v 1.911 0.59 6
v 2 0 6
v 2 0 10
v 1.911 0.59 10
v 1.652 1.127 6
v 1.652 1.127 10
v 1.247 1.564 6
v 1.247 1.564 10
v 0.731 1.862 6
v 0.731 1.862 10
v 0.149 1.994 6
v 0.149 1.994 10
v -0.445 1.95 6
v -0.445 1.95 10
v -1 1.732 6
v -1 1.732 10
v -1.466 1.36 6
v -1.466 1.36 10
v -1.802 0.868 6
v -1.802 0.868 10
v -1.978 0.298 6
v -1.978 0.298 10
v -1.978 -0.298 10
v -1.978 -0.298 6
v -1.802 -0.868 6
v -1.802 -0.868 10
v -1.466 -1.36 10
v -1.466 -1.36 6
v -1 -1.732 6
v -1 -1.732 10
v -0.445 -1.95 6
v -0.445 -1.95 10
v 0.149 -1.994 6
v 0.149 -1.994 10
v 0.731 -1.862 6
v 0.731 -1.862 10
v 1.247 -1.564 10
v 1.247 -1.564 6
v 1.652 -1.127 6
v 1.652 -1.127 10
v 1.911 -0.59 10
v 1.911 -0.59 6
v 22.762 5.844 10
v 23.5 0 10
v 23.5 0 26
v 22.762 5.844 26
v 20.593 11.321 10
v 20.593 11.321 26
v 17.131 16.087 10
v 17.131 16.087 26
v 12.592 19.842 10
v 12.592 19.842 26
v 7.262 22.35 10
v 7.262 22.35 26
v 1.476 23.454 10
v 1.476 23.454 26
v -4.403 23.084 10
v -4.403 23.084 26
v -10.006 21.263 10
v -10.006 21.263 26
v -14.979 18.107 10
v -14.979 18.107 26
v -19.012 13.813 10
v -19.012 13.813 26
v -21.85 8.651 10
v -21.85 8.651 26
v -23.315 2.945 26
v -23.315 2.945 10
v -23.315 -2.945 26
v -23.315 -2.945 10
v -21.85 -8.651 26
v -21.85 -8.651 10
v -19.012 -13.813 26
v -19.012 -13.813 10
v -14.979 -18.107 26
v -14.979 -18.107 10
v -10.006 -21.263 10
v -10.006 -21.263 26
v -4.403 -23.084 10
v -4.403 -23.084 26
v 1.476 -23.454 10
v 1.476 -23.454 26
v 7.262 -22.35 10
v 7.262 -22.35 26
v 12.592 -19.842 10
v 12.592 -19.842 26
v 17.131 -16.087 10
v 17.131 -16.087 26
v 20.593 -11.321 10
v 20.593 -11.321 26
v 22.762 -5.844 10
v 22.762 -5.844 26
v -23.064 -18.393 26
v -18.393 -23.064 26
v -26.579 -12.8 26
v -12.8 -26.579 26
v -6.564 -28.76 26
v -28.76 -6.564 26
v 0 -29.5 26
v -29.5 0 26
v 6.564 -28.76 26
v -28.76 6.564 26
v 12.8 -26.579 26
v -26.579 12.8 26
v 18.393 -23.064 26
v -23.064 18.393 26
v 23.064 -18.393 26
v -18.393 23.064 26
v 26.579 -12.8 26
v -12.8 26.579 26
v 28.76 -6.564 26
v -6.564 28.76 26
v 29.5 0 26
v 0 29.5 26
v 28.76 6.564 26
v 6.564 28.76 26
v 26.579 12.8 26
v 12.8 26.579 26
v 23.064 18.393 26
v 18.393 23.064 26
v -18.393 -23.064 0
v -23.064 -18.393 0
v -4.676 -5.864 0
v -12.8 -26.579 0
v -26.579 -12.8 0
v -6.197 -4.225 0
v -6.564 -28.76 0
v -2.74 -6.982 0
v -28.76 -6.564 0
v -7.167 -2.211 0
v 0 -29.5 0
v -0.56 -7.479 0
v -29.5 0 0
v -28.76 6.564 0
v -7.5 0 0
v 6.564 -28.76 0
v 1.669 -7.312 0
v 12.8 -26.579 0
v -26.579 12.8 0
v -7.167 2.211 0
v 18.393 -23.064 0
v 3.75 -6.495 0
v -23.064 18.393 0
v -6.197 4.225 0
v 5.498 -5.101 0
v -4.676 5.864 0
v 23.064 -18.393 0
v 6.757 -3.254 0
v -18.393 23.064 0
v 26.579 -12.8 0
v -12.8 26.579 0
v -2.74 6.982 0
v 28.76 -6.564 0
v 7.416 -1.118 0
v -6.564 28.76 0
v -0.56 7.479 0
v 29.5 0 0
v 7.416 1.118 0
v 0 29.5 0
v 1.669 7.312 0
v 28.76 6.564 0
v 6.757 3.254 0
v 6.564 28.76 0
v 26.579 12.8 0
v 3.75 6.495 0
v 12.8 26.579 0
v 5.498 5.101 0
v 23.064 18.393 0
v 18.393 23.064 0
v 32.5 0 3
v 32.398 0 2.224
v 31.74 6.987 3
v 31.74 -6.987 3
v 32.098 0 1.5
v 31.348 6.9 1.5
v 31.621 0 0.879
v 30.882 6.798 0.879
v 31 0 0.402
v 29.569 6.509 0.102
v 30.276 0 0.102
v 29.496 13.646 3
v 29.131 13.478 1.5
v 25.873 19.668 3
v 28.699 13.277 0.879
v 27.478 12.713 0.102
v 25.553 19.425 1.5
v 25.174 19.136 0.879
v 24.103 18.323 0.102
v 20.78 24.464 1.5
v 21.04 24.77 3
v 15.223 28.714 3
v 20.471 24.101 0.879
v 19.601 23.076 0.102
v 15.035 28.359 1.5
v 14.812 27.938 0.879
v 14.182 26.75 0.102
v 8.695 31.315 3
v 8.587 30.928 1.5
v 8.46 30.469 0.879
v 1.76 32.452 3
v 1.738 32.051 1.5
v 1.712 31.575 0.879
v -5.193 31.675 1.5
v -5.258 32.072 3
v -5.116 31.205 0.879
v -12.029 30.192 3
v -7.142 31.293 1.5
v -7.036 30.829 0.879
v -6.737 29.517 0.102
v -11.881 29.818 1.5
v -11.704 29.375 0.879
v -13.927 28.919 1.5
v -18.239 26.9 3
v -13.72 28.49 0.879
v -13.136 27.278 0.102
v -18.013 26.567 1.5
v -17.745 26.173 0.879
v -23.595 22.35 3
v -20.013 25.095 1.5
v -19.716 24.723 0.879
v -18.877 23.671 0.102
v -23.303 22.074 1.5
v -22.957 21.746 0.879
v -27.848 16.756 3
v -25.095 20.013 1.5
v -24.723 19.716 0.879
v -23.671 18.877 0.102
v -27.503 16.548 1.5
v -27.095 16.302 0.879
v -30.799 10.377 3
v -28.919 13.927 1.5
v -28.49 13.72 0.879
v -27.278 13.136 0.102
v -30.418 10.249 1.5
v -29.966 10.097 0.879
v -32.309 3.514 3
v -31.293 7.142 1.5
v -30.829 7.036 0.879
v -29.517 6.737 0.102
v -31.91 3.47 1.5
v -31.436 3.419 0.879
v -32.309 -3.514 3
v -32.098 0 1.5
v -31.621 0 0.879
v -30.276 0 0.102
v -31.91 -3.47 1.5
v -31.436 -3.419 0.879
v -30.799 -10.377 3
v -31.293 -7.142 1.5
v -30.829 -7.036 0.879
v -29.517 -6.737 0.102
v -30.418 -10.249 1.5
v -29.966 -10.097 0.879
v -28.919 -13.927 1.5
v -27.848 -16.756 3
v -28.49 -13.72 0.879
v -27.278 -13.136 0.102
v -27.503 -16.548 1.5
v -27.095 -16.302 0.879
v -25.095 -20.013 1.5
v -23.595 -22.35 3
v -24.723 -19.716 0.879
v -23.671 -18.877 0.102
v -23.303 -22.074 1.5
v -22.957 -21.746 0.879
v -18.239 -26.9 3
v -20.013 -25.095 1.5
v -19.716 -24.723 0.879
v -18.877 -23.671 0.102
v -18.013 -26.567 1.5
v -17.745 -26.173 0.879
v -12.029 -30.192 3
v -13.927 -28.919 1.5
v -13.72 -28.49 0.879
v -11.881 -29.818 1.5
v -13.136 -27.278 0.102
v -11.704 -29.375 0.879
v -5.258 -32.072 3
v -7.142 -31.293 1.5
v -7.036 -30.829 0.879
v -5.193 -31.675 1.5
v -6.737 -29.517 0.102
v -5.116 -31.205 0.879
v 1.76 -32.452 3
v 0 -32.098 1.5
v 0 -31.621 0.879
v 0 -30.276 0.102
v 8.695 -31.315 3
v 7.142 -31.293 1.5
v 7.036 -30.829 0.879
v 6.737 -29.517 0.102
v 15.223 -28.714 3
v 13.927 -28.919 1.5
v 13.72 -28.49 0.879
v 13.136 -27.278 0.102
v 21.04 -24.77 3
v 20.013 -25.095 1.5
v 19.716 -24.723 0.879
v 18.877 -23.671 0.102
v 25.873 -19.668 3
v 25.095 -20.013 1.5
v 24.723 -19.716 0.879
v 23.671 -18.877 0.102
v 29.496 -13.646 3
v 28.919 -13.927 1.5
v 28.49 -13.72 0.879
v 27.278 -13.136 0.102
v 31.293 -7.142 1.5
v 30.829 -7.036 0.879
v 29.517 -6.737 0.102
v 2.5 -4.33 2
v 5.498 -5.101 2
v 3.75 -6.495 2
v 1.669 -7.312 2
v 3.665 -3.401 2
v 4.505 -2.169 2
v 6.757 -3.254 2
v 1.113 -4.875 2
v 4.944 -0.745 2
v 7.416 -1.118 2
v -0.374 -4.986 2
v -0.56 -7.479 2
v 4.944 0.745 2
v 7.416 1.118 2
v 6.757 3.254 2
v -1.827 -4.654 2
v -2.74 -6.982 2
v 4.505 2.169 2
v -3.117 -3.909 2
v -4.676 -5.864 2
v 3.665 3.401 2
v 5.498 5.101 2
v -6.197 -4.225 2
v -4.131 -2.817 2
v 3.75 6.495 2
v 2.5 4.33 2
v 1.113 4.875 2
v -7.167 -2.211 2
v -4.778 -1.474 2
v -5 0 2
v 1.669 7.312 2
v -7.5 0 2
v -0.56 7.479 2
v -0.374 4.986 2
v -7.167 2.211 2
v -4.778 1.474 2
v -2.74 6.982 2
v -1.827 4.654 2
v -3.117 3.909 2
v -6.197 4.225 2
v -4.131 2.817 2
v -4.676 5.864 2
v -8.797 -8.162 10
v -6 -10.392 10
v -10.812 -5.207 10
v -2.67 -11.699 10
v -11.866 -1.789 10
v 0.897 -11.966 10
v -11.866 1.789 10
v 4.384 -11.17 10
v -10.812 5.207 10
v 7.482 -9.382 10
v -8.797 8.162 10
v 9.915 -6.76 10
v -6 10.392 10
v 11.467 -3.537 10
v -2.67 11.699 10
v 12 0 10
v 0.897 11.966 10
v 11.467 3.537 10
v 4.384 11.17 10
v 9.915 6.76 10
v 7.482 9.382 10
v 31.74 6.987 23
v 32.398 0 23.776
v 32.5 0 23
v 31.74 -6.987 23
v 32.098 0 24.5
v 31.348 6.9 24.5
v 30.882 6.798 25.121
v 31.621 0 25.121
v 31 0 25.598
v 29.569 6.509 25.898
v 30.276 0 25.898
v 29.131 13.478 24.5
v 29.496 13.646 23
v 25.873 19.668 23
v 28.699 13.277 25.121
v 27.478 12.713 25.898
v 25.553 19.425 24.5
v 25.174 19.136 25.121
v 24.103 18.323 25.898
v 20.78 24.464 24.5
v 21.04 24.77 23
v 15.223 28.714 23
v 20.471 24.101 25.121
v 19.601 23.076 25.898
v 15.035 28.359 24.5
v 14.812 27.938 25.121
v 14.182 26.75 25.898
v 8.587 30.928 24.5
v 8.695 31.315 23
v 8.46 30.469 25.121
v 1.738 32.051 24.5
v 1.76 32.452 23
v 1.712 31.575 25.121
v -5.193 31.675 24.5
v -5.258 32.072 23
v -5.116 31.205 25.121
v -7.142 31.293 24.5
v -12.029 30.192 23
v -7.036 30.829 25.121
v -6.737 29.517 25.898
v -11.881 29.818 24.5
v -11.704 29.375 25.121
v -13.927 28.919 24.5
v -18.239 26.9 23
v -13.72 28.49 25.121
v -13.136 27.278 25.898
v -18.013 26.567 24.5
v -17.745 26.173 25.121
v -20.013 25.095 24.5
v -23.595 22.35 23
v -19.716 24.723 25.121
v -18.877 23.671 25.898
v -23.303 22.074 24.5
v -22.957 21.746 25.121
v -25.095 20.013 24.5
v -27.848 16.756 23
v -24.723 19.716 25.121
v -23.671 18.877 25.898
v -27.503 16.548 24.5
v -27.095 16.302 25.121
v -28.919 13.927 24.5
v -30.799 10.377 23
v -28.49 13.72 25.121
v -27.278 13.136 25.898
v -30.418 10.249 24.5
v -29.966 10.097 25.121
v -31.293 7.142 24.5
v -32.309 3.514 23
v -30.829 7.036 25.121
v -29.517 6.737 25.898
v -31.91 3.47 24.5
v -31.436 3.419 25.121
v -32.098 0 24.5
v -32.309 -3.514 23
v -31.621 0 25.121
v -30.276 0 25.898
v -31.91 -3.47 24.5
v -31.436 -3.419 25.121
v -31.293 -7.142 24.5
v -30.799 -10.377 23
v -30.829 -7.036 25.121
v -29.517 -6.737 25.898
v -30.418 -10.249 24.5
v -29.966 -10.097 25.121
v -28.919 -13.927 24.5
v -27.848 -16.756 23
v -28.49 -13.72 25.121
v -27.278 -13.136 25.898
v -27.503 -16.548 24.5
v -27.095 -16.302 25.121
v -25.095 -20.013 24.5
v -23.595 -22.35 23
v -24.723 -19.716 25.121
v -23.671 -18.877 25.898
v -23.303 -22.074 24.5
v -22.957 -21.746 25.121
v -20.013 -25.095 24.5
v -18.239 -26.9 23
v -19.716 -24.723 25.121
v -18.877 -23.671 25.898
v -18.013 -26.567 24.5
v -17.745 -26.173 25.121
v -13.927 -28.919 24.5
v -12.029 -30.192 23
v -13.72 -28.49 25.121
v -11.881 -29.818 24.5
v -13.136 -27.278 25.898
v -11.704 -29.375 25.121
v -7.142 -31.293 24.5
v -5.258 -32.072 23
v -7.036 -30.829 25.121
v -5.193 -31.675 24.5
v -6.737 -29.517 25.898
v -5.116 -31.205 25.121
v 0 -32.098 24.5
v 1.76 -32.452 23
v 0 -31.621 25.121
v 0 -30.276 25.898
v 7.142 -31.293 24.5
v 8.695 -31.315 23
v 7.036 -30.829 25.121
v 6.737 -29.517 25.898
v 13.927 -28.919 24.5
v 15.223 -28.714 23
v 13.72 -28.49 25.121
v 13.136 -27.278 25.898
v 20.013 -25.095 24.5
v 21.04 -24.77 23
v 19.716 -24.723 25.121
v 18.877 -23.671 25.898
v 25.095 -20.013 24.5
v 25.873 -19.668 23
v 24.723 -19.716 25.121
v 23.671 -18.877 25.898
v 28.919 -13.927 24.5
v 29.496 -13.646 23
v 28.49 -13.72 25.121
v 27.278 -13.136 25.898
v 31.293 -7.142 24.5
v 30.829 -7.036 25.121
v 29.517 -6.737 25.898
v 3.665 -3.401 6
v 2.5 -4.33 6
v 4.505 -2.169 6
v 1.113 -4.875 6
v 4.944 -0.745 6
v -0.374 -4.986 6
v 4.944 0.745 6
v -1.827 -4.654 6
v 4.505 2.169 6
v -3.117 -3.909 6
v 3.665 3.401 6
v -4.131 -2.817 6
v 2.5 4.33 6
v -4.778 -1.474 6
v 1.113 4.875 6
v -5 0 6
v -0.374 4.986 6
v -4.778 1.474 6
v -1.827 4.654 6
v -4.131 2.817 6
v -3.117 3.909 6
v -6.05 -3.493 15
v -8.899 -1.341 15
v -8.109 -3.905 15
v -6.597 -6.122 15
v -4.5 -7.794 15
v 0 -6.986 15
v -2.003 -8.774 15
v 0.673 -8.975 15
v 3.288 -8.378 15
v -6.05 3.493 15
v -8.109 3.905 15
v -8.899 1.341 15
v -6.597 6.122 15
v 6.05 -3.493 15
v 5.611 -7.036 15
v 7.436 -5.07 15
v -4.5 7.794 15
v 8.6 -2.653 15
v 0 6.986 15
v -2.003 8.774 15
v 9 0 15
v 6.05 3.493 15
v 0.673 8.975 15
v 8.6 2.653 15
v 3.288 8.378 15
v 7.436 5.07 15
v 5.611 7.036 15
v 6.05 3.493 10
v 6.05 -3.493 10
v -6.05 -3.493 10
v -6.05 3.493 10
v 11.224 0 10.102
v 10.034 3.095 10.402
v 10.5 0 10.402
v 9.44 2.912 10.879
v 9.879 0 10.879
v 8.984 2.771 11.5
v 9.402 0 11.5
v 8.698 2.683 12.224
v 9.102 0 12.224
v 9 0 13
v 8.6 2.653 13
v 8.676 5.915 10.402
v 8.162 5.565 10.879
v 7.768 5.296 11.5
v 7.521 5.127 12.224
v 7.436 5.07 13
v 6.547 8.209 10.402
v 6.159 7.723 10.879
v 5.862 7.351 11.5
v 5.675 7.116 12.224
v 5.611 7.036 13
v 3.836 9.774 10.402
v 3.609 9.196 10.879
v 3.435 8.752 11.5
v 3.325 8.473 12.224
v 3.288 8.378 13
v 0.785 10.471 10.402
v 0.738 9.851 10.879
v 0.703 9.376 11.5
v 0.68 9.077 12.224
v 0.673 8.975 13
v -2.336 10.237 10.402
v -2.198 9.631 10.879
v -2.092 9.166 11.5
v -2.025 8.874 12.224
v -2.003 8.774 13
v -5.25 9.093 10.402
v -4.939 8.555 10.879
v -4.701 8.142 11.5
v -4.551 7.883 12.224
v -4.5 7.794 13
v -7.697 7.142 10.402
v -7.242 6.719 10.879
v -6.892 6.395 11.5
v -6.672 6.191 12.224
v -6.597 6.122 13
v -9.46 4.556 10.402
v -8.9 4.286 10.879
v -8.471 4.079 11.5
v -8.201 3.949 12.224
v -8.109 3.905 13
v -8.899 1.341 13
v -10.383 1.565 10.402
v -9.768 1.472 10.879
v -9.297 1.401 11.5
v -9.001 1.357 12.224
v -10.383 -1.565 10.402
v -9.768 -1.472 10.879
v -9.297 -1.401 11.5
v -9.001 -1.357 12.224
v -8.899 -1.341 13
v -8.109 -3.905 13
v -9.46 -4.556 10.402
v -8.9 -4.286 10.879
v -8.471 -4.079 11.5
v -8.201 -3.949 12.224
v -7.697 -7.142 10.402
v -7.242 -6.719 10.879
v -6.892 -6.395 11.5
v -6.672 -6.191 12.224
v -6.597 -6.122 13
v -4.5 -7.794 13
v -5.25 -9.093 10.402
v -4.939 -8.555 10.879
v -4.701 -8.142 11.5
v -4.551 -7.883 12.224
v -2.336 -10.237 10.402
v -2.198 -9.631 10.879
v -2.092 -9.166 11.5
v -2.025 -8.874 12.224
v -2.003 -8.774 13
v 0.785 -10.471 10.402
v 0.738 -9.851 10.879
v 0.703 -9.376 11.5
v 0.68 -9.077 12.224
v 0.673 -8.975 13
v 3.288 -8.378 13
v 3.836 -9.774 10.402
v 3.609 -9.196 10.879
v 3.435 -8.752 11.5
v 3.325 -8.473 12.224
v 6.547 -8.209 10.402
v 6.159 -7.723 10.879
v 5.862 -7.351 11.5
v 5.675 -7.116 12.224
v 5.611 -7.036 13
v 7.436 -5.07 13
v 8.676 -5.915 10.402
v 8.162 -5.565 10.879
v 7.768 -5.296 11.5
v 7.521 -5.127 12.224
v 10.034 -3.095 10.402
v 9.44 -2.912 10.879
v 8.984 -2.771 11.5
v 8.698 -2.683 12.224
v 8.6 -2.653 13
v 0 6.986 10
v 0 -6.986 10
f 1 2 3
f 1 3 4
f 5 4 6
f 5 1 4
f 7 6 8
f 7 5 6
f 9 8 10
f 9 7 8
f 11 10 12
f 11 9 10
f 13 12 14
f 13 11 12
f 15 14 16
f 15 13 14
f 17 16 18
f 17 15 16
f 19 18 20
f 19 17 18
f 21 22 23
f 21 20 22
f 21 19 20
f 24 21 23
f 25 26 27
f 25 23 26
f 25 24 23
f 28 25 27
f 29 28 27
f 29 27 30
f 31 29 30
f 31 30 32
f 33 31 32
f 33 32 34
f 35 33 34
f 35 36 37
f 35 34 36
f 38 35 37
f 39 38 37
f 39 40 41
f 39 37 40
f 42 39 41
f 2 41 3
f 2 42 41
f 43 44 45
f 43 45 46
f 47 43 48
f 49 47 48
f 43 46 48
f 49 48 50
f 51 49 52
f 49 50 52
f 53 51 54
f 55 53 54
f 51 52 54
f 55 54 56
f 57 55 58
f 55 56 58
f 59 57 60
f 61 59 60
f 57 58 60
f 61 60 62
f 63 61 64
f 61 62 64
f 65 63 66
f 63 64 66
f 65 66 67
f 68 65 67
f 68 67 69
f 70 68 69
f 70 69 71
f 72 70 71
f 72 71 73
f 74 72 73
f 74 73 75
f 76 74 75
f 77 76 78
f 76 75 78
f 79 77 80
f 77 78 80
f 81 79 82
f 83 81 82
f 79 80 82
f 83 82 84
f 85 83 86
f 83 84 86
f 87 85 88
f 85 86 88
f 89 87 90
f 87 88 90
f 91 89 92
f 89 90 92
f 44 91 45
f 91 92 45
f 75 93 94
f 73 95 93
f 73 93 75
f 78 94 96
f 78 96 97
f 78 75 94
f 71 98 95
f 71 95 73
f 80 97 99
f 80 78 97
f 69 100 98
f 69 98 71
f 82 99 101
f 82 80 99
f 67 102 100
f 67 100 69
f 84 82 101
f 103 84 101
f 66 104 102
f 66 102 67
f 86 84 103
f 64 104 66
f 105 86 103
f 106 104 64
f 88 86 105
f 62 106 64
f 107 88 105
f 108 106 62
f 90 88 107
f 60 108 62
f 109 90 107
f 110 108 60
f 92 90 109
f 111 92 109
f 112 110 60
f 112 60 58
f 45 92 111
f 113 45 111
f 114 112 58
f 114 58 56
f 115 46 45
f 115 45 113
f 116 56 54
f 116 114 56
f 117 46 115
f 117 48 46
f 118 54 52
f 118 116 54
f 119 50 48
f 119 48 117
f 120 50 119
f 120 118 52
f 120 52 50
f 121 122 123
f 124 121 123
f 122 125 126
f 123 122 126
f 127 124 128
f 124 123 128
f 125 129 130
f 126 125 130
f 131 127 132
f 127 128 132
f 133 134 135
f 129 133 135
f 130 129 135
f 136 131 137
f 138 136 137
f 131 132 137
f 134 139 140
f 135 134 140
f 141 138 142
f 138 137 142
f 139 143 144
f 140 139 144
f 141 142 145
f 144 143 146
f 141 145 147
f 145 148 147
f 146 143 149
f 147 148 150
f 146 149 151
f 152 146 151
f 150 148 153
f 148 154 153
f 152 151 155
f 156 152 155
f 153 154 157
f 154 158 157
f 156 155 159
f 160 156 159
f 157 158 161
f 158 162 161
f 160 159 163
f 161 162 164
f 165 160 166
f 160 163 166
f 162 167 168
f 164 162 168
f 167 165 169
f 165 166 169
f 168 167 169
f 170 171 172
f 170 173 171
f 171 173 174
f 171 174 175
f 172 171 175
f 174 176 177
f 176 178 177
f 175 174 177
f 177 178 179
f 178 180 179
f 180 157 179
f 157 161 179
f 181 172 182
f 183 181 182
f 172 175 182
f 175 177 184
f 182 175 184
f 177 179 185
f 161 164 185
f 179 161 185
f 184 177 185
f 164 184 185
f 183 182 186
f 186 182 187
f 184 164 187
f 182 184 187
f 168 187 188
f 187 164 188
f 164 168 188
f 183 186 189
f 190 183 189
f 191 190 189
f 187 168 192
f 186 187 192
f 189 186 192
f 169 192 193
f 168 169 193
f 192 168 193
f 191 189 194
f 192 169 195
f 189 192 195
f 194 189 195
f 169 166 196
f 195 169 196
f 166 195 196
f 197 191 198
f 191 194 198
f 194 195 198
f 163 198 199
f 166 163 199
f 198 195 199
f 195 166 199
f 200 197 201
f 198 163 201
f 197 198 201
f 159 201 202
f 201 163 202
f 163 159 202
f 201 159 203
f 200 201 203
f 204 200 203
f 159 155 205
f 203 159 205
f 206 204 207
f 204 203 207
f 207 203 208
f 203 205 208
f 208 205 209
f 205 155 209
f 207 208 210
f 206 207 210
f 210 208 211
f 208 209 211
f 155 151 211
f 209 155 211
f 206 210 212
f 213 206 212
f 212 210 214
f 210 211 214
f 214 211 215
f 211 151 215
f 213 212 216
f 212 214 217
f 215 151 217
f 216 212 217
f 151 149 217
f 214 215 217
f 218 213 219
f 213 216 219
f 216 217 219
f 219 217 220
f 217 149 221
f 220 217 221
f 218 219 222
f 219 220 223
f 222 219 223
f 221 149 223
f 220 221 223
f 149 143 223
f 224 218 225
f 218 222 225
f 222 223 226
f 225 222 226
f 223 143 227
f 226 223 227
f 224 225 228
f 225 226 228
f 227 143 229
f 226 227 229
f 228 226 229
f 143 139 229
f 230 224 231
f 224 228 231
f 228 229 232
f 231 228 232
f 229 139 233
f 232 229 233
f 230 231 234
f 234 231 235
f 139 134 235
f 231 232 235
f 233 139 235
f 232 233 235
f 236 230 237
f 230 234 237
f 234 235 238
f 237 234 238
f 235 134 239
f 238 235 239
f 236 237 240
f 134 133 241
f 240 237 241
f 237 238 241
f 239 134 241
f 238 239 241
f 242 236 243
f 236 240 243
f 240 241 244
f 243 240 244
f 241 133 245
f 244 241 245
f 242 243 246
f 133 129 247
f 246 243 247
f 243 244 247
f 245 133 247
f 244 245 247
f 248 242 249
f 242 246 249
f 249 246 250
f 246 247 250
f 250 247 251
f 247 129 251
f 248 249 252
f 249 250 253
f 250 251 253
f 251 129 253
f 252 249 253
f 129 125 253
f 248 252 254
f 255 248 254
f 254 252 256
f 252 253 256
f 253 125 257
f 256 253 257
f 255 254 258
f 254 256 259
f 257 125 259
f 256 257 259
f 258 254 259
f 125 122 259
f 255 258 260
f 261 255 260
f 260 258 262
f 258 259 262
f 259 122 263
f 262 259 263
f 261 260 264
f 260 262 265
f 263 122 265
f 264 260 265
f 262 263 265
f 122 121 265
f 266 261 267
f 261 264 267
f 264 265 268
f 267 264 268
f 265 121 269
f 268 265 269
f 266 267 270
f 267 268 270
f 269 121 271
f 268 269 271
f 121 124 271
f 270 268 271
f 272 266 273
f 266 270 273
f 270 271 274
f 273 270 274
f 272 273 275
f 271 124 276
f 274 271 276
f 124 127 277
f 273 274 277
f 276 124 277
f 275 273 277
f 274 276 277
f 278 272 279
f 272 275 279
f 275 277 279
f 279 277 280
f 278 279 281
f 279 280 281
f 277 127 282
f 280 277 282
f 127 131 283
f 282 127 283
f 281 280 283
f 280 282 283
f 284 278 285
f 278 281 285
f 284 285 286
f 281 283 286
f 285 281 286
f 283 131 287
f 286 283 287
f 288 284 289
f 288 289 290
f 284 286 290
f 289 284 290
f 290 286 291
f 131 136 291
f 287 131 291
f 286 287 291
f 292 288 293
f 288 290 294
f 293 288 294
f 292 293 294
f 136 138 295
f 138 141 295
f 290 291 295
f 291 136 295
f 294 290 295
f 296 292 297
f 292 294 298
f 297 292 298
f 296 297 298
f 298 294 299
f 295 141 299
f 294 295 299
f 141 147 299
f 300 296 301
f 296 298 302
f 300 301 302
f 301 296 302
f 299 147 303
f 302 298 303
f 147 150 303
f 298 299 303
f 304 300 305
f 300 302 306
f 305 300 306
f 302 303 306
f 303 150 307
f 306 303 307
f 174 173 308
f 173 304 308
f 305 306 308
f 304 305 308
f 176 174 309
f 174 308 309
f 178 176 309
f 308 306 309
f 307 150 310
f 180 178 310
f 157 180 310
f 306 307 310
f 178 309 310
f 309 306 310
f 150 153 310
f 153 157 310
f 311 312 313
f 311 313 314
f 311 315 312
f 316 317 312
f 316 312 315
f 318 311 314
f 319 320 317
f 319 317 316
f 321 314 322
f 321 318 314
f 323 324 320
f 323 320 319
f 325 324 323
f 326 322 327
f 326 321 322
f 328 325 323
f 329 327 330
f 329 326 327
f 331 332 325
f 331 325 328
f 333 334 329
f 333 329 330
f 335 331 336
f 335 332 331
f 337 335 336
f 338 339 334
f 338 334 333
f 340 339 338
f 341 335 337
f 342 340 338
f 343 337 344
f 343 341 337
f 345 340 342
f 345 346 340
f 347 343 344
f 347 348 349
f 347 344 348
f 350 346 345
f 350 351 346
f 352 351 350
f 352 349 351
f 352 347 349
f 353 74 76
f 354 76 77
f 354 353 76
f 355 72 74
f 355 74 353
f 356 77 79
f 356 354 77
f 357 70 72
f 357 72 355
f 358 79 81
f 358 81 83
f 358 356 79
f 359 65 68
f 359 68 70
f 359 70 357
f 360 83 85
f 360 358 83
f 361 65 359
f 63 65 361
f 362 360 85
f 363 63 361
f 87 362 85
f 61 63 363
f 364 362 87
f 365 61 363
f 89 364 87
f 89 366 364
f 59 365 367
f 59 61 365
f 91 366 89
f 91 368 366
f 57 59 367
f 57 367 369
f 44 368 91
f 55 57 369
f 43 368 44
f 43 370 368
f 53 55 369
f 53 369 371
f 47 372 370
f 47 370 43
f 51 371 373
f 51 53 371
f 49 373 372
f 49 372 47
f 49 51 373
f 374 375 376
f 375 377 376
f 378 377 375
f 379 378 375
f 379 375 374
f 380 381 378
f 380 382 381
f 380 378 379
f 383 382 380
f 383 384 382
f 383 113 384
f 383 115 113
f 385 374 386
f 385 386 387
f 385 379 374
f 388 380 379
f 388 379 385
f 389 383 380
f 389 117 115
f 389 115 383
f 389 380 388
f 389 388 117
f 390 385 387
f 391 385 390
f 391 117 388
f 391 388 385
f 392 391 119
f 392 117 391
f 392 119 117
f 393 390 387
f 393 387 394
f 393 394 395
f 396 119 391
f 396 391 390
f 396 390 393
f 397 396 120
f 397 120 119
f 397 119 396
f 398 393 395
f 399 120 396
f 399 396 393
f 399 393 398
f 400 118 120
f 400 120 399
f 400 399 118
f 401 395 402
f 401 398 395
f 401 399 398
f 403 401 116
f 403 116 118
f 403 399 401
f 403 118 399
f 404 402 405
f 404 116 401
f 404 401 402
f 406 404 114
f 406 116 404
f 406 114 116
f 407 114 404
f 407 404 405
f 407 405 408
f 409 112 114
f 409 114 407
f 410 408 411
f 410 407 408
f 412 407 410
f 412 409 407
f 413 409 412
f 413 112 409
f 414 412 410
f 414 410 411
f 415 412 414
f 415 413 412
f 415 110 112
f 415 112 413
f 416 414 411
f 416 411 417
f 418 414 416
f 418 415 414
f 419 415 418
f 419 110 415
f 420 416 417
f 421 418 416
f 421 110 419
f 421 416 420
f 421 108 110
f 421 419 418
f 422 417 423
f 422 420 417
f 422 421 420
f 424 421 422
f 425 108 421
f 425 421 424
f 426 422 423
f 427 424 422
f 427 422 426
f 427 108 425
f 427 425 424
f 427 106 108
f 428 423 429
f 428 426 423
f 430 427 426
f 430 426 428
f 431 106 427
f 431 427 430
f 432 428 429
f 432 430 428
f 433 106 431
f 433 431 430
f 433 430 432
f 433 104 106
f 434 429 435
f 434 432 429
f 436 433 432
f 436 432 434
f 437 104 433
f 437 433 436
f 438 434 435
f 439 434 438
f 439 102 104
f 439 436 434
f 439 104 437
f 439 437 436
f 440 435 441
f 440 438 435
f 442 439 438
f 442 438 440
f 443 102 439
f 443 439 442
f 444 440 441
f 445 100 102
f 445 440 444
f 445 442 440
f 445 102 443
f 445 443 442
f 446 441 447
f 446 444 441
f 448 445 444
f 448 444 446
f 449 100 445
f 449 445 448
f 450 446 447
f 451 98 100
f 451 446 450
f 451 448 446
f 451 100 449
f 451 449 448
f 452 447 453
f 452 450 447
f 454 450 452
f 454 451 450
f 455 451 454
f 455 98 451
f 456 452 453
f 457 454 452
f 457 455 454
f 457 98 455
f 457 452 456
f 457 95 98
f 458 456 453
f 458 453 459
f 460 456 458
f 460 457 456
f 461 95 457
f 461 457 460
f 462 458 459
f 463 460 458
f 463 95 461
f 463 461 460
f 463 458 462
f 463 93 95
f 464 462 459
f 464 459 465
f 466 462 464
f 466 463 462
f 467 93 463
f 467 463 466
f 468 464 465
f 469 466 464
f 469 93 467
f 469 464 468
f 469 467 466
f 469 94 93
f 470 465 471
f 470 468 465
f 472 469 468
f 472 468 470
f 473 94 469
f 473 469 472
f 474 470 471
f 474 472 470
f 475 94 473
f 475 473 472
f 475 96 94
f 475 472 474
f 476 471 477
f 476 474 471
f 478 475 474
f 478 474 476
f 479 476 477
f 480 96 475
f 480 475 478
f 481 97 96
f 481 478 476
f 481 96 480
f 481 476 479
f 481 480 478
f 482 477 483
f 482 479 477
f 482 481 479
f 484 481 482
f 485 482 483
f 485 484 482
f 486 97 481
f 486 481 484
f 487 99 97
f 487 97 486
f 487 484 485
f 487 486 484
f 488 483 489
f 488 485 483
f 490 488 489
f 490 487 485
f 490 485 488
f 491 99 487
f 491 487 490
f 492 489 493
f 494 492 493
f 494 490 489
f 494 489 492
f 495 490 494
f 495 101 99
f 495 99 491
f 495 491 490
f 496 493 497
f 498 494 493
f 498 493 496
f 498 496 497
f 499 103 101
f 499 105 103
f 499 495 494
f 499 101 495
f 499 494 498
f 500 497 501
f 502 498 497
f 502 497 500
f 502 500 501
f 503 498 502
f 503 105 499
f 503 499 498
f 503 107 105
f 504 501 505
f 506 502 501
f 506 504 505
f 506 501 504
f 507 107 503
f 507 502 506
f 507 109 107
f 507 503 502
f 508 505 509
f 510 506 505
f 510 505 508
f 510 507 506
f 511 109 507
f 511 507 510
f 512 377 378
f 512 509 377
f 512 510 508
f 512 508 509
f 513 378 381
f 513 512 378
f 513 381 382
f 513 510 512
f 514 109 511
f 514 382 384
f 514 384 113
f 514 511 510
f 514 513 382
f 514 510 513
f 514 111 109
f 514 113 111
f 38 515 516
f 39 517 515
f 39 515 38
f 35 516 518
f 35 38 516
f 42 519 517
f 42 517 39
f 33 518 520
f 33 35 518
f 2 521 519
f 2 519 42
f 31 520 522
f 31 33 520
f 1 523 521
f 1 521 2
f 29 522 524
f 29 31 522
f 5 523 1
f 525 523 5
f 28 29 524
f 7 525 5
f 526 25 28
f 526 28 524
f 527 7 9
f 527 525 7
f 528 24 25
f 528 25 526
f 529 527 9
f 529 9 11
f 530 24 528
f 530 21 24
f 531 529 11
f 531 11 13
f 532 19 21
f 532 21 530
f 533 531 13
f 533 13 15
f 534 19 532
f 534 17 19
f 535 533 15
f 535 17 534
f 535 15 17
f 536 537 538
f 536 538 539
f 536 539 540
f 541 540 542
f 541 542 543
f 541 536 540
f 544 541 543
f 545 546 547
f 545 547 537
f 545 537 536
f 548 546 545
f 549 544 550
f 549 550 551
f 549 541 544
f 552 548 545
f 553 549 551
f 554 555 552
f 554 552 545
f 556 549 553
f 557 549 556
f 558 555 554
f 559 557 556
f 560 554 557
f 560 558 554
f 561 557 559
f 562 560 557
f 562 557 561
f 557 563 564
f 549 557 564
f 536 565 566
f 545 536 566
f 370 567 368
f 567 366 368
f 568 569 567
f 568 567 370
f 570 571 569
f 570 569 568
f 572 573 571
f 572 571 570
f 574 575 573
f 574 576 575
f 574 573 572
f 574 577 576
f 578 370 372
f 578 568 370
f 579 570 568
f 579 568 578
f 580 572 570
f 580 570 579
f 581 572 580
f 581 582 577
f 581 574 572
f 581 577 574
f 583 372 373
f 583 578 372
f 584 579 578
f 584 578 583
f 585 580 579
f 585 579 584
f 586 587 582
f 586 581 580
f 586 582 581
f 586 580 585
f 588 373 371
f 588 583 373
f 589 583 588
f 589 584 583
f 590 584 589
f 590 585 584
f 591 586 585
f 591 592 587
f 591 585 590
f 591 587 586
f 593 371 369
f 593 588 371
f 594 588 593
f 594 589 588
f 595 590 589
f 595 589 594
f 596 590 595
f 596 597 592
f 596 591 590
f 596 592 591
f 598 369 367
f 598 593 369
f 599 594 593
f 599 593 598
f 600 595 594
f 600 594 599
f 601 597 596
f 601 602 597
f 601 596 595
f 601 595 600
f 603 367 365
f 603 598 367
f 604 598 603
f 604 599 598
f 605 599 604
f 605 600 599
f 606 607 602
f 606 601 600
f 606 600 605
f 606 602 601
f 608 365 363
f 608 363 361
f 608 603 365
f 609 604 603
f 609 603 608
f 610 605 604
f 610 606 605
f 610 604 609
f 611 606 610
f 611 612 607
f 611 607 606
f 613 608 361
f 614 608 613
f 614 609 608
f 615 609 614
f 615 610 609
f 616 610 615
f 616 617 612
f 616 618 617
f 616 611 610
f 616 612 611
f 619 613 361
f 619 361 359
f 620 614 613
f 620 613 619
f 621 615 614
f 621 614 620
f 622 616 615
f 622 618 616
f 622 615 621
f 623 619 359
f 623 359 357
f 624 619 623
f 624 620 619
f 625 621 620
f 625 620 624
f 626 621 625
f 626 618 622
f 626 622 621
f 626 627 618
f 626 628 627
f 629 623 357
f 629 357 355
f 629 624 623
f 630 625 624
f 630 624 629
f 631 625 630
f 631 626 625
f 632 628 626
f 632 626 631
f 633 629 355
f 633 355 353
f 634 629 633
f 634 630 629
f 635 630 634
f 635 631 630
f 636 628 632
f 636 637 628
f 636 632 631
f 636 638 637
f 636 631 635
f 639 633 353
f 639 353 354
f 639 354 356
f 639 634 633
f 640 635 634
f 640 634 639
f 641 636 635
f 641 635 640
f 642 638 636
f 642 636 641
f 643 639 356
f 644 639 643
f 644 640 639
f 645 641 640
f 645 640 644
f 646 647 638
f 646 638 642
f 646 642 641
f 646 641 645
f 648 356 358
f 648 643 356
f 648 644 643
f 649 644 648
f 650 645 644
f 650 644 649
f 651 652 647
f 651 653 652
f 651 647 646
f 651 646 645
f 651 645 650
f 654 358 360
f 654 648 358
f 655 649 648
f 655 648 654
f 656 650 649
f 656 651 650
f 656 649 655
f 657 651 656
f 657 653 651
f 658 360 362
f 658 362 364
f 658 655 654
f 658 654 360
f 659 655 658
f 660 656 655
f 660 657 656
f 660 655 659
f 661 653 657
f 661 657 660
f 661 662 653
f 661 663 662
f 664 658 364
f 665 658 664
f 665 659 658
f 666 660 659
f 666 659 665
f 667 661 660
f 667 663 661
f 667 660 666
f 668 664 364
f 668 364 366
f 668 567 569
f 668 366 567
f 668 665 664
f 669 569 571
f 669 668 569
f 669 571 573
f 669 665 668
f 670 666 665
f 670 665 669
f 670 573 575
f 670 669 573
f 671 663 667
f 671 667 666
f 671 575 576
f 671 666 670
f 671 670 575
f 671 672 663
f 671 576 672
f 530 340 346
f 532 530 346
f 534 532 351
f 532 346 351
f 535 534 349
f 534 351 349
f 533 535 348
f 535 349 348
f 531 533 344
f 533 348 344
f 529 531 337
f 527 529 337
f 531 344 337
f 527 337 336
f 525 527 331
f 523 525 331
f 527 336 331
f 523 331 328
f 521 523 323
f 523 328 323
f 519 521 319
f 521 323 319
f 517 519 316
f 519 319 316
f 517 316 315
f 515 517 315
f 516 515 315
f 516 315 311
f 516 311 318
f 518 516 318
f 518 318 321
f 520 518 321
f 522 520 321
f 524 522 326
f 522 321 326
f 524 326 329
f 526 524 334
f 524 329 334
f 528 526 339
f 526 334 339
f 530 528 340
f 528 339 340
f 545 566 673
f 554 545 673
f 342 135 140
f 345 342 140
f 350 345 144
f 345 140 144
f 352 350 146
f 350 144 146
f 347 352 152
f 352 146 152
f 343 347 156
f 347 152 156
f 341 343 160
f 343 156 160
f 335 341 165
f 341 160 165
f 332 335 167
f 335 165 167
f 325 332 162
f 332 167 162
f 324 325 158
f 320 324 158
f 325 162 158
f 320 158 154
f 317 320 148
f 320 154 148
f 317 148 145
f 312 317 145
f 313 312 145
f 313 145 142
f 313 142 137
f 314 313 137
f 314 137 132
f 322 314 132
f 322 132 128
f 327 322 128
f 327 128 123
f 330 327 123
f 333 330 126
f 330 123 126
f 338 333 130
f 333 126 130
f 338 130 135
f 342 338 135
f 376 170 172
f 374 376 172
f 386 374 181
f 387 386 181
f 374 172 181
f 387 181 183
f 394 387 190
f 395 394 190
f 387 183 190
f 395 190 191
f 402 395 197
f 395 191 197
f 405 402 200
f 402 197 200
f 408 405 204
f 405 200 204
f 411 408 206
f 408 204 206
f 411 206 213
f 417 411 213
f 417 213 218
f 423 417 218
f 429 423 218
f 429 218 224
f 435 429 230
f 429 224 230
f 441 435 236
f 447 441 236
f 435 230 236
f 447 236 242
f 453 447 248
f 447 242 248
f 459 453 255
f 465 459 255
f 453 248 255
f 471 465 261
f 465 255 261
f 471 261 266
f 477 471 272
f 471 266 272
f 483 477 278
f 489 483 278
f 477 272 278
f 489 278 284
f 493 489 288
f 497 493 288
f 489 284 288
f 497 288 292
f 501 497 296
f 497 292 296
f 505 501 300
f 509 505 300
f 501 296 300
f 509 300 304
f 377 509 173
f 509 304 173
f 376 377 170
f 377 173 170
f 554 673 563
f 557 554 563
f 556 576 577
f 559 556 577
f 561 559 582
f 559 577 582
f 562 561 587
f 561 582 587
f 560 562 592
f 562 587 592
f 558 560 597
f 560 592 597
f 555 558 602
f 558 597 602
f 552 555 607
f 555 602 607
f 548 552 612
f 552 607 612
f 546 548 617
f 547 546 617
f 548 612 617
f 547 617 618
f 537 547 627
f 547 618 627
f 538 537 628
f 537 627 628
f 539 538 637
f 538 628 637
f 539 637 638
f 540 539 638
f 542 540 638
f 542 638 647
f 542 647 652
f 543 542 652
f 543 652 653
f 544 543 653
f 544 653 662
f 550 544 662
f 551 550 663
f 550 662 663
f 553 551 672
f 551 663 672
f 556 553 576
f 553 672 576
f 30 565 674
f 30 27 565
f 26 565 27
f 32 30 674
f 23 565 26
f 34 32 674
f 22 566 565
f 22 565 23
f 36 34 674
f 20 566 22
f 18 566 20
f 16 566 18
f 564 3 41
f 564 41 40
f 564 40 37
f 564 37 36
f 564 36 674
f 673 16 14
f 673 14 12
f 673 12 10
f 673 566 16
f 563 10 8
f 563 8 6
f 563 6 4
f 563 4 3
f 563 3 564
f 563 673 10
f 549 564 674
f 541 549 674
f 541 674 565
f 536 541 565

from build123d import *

# Parameters (mm, degrees)
SKETCH1_R           = 32.5
SKETCH1_R_2         = 2
BOSS_EXTRUDE1_DEPTH = 26
FILLET1_R           = 3
SKETCH2_R           = 23.5
CUT_EXTRUDE1_DEPTH  = 16
SKETCH3_R           = 9
BOSS_EXTRUDE2_DEPTH = 5
SKETCH4_R           = 7.5
CUT_EXTRUDE2_DEPTH  = 2
SKETCH5_R           = 5
CUT_EXTRUDE3_DEPTH  = 4
FILLET2_R           = 3


with BuildPart() as part:
    # Sketch1 → Boss-Extrude1 (new body)
    with BuildSketch(Plane.XY):
        Circle(SKETCH1_R)
        Circle(SKETCH1_R_2, mode=Mode.SUBTRACT)
    extrude(amount=BOSS_EXTRUDE1_DEPTH)

    # Fillet1
    fillet1_edges = [part.edges().sort_by_distance(p)[0] for p in [
        (-32.5, 0, 0),
        (-32.5, 0, 26),
    ]]
    fillet(fillet1_edges, radius=FILLET1_R)

    # Sketch2 → Cut-Extrude1 (cut)
    with BuildSketch(Plane.XY.offset(26)):
        Circle(SKETCH2_R)
    extrude(amount=-CUT_EXTRUDE1_DEPTH, mode=Mode.SUBTRACT)

    # Sketch3 → Boss-Extrude2 (add)
    with BuildSketch(Plane.XY.offset(10)):
        Circle(SKETCH3_R)
        Polygon((-6.05, -3.492969129), (-6.05, 3.492969129), (0, 6.985938257), (6.05, 3.492969129), (6.05, -3.492969129), (0, -6.985938257), align=None, mode=Mode.SUBTRACT)
    extrude(amount=BOSS_EXTRUDE2_DEPTH)

    # Sketch4 → Cut-Extrude2 (cut)
    with BuildSketch(Plane(origin=(0, 0, 0), x_dir=(-1, 0, 0), z_dir=(0, 0, -1))):
        Circle(SKETCH4_R)
    extrude(amount=-CUT_EXTRUDE2_DEPTH, mode=Mode.SUBTRACT)

    # Sketch5 → Cut-Extrude3 (cut)
    with BuildSketch(Plane(origin=(0, 0, 2), x_dir=(-1, 0, 0), z_dir=(0, 0, -1))):
        Circle(SKETCH5_R)
    extrude(amount=-CUT_EXTRUDE3_DEPTH, mode=Mode.SUBTRACT)

    # Fillet2
    fillet2_edges = [part.edges().sort_by_distance(p)[0] for p in [
        (-9, 0, 10),
    ]]
    fillet(fillet2_edges, radius=FILLET2_R)


solid = part.part
